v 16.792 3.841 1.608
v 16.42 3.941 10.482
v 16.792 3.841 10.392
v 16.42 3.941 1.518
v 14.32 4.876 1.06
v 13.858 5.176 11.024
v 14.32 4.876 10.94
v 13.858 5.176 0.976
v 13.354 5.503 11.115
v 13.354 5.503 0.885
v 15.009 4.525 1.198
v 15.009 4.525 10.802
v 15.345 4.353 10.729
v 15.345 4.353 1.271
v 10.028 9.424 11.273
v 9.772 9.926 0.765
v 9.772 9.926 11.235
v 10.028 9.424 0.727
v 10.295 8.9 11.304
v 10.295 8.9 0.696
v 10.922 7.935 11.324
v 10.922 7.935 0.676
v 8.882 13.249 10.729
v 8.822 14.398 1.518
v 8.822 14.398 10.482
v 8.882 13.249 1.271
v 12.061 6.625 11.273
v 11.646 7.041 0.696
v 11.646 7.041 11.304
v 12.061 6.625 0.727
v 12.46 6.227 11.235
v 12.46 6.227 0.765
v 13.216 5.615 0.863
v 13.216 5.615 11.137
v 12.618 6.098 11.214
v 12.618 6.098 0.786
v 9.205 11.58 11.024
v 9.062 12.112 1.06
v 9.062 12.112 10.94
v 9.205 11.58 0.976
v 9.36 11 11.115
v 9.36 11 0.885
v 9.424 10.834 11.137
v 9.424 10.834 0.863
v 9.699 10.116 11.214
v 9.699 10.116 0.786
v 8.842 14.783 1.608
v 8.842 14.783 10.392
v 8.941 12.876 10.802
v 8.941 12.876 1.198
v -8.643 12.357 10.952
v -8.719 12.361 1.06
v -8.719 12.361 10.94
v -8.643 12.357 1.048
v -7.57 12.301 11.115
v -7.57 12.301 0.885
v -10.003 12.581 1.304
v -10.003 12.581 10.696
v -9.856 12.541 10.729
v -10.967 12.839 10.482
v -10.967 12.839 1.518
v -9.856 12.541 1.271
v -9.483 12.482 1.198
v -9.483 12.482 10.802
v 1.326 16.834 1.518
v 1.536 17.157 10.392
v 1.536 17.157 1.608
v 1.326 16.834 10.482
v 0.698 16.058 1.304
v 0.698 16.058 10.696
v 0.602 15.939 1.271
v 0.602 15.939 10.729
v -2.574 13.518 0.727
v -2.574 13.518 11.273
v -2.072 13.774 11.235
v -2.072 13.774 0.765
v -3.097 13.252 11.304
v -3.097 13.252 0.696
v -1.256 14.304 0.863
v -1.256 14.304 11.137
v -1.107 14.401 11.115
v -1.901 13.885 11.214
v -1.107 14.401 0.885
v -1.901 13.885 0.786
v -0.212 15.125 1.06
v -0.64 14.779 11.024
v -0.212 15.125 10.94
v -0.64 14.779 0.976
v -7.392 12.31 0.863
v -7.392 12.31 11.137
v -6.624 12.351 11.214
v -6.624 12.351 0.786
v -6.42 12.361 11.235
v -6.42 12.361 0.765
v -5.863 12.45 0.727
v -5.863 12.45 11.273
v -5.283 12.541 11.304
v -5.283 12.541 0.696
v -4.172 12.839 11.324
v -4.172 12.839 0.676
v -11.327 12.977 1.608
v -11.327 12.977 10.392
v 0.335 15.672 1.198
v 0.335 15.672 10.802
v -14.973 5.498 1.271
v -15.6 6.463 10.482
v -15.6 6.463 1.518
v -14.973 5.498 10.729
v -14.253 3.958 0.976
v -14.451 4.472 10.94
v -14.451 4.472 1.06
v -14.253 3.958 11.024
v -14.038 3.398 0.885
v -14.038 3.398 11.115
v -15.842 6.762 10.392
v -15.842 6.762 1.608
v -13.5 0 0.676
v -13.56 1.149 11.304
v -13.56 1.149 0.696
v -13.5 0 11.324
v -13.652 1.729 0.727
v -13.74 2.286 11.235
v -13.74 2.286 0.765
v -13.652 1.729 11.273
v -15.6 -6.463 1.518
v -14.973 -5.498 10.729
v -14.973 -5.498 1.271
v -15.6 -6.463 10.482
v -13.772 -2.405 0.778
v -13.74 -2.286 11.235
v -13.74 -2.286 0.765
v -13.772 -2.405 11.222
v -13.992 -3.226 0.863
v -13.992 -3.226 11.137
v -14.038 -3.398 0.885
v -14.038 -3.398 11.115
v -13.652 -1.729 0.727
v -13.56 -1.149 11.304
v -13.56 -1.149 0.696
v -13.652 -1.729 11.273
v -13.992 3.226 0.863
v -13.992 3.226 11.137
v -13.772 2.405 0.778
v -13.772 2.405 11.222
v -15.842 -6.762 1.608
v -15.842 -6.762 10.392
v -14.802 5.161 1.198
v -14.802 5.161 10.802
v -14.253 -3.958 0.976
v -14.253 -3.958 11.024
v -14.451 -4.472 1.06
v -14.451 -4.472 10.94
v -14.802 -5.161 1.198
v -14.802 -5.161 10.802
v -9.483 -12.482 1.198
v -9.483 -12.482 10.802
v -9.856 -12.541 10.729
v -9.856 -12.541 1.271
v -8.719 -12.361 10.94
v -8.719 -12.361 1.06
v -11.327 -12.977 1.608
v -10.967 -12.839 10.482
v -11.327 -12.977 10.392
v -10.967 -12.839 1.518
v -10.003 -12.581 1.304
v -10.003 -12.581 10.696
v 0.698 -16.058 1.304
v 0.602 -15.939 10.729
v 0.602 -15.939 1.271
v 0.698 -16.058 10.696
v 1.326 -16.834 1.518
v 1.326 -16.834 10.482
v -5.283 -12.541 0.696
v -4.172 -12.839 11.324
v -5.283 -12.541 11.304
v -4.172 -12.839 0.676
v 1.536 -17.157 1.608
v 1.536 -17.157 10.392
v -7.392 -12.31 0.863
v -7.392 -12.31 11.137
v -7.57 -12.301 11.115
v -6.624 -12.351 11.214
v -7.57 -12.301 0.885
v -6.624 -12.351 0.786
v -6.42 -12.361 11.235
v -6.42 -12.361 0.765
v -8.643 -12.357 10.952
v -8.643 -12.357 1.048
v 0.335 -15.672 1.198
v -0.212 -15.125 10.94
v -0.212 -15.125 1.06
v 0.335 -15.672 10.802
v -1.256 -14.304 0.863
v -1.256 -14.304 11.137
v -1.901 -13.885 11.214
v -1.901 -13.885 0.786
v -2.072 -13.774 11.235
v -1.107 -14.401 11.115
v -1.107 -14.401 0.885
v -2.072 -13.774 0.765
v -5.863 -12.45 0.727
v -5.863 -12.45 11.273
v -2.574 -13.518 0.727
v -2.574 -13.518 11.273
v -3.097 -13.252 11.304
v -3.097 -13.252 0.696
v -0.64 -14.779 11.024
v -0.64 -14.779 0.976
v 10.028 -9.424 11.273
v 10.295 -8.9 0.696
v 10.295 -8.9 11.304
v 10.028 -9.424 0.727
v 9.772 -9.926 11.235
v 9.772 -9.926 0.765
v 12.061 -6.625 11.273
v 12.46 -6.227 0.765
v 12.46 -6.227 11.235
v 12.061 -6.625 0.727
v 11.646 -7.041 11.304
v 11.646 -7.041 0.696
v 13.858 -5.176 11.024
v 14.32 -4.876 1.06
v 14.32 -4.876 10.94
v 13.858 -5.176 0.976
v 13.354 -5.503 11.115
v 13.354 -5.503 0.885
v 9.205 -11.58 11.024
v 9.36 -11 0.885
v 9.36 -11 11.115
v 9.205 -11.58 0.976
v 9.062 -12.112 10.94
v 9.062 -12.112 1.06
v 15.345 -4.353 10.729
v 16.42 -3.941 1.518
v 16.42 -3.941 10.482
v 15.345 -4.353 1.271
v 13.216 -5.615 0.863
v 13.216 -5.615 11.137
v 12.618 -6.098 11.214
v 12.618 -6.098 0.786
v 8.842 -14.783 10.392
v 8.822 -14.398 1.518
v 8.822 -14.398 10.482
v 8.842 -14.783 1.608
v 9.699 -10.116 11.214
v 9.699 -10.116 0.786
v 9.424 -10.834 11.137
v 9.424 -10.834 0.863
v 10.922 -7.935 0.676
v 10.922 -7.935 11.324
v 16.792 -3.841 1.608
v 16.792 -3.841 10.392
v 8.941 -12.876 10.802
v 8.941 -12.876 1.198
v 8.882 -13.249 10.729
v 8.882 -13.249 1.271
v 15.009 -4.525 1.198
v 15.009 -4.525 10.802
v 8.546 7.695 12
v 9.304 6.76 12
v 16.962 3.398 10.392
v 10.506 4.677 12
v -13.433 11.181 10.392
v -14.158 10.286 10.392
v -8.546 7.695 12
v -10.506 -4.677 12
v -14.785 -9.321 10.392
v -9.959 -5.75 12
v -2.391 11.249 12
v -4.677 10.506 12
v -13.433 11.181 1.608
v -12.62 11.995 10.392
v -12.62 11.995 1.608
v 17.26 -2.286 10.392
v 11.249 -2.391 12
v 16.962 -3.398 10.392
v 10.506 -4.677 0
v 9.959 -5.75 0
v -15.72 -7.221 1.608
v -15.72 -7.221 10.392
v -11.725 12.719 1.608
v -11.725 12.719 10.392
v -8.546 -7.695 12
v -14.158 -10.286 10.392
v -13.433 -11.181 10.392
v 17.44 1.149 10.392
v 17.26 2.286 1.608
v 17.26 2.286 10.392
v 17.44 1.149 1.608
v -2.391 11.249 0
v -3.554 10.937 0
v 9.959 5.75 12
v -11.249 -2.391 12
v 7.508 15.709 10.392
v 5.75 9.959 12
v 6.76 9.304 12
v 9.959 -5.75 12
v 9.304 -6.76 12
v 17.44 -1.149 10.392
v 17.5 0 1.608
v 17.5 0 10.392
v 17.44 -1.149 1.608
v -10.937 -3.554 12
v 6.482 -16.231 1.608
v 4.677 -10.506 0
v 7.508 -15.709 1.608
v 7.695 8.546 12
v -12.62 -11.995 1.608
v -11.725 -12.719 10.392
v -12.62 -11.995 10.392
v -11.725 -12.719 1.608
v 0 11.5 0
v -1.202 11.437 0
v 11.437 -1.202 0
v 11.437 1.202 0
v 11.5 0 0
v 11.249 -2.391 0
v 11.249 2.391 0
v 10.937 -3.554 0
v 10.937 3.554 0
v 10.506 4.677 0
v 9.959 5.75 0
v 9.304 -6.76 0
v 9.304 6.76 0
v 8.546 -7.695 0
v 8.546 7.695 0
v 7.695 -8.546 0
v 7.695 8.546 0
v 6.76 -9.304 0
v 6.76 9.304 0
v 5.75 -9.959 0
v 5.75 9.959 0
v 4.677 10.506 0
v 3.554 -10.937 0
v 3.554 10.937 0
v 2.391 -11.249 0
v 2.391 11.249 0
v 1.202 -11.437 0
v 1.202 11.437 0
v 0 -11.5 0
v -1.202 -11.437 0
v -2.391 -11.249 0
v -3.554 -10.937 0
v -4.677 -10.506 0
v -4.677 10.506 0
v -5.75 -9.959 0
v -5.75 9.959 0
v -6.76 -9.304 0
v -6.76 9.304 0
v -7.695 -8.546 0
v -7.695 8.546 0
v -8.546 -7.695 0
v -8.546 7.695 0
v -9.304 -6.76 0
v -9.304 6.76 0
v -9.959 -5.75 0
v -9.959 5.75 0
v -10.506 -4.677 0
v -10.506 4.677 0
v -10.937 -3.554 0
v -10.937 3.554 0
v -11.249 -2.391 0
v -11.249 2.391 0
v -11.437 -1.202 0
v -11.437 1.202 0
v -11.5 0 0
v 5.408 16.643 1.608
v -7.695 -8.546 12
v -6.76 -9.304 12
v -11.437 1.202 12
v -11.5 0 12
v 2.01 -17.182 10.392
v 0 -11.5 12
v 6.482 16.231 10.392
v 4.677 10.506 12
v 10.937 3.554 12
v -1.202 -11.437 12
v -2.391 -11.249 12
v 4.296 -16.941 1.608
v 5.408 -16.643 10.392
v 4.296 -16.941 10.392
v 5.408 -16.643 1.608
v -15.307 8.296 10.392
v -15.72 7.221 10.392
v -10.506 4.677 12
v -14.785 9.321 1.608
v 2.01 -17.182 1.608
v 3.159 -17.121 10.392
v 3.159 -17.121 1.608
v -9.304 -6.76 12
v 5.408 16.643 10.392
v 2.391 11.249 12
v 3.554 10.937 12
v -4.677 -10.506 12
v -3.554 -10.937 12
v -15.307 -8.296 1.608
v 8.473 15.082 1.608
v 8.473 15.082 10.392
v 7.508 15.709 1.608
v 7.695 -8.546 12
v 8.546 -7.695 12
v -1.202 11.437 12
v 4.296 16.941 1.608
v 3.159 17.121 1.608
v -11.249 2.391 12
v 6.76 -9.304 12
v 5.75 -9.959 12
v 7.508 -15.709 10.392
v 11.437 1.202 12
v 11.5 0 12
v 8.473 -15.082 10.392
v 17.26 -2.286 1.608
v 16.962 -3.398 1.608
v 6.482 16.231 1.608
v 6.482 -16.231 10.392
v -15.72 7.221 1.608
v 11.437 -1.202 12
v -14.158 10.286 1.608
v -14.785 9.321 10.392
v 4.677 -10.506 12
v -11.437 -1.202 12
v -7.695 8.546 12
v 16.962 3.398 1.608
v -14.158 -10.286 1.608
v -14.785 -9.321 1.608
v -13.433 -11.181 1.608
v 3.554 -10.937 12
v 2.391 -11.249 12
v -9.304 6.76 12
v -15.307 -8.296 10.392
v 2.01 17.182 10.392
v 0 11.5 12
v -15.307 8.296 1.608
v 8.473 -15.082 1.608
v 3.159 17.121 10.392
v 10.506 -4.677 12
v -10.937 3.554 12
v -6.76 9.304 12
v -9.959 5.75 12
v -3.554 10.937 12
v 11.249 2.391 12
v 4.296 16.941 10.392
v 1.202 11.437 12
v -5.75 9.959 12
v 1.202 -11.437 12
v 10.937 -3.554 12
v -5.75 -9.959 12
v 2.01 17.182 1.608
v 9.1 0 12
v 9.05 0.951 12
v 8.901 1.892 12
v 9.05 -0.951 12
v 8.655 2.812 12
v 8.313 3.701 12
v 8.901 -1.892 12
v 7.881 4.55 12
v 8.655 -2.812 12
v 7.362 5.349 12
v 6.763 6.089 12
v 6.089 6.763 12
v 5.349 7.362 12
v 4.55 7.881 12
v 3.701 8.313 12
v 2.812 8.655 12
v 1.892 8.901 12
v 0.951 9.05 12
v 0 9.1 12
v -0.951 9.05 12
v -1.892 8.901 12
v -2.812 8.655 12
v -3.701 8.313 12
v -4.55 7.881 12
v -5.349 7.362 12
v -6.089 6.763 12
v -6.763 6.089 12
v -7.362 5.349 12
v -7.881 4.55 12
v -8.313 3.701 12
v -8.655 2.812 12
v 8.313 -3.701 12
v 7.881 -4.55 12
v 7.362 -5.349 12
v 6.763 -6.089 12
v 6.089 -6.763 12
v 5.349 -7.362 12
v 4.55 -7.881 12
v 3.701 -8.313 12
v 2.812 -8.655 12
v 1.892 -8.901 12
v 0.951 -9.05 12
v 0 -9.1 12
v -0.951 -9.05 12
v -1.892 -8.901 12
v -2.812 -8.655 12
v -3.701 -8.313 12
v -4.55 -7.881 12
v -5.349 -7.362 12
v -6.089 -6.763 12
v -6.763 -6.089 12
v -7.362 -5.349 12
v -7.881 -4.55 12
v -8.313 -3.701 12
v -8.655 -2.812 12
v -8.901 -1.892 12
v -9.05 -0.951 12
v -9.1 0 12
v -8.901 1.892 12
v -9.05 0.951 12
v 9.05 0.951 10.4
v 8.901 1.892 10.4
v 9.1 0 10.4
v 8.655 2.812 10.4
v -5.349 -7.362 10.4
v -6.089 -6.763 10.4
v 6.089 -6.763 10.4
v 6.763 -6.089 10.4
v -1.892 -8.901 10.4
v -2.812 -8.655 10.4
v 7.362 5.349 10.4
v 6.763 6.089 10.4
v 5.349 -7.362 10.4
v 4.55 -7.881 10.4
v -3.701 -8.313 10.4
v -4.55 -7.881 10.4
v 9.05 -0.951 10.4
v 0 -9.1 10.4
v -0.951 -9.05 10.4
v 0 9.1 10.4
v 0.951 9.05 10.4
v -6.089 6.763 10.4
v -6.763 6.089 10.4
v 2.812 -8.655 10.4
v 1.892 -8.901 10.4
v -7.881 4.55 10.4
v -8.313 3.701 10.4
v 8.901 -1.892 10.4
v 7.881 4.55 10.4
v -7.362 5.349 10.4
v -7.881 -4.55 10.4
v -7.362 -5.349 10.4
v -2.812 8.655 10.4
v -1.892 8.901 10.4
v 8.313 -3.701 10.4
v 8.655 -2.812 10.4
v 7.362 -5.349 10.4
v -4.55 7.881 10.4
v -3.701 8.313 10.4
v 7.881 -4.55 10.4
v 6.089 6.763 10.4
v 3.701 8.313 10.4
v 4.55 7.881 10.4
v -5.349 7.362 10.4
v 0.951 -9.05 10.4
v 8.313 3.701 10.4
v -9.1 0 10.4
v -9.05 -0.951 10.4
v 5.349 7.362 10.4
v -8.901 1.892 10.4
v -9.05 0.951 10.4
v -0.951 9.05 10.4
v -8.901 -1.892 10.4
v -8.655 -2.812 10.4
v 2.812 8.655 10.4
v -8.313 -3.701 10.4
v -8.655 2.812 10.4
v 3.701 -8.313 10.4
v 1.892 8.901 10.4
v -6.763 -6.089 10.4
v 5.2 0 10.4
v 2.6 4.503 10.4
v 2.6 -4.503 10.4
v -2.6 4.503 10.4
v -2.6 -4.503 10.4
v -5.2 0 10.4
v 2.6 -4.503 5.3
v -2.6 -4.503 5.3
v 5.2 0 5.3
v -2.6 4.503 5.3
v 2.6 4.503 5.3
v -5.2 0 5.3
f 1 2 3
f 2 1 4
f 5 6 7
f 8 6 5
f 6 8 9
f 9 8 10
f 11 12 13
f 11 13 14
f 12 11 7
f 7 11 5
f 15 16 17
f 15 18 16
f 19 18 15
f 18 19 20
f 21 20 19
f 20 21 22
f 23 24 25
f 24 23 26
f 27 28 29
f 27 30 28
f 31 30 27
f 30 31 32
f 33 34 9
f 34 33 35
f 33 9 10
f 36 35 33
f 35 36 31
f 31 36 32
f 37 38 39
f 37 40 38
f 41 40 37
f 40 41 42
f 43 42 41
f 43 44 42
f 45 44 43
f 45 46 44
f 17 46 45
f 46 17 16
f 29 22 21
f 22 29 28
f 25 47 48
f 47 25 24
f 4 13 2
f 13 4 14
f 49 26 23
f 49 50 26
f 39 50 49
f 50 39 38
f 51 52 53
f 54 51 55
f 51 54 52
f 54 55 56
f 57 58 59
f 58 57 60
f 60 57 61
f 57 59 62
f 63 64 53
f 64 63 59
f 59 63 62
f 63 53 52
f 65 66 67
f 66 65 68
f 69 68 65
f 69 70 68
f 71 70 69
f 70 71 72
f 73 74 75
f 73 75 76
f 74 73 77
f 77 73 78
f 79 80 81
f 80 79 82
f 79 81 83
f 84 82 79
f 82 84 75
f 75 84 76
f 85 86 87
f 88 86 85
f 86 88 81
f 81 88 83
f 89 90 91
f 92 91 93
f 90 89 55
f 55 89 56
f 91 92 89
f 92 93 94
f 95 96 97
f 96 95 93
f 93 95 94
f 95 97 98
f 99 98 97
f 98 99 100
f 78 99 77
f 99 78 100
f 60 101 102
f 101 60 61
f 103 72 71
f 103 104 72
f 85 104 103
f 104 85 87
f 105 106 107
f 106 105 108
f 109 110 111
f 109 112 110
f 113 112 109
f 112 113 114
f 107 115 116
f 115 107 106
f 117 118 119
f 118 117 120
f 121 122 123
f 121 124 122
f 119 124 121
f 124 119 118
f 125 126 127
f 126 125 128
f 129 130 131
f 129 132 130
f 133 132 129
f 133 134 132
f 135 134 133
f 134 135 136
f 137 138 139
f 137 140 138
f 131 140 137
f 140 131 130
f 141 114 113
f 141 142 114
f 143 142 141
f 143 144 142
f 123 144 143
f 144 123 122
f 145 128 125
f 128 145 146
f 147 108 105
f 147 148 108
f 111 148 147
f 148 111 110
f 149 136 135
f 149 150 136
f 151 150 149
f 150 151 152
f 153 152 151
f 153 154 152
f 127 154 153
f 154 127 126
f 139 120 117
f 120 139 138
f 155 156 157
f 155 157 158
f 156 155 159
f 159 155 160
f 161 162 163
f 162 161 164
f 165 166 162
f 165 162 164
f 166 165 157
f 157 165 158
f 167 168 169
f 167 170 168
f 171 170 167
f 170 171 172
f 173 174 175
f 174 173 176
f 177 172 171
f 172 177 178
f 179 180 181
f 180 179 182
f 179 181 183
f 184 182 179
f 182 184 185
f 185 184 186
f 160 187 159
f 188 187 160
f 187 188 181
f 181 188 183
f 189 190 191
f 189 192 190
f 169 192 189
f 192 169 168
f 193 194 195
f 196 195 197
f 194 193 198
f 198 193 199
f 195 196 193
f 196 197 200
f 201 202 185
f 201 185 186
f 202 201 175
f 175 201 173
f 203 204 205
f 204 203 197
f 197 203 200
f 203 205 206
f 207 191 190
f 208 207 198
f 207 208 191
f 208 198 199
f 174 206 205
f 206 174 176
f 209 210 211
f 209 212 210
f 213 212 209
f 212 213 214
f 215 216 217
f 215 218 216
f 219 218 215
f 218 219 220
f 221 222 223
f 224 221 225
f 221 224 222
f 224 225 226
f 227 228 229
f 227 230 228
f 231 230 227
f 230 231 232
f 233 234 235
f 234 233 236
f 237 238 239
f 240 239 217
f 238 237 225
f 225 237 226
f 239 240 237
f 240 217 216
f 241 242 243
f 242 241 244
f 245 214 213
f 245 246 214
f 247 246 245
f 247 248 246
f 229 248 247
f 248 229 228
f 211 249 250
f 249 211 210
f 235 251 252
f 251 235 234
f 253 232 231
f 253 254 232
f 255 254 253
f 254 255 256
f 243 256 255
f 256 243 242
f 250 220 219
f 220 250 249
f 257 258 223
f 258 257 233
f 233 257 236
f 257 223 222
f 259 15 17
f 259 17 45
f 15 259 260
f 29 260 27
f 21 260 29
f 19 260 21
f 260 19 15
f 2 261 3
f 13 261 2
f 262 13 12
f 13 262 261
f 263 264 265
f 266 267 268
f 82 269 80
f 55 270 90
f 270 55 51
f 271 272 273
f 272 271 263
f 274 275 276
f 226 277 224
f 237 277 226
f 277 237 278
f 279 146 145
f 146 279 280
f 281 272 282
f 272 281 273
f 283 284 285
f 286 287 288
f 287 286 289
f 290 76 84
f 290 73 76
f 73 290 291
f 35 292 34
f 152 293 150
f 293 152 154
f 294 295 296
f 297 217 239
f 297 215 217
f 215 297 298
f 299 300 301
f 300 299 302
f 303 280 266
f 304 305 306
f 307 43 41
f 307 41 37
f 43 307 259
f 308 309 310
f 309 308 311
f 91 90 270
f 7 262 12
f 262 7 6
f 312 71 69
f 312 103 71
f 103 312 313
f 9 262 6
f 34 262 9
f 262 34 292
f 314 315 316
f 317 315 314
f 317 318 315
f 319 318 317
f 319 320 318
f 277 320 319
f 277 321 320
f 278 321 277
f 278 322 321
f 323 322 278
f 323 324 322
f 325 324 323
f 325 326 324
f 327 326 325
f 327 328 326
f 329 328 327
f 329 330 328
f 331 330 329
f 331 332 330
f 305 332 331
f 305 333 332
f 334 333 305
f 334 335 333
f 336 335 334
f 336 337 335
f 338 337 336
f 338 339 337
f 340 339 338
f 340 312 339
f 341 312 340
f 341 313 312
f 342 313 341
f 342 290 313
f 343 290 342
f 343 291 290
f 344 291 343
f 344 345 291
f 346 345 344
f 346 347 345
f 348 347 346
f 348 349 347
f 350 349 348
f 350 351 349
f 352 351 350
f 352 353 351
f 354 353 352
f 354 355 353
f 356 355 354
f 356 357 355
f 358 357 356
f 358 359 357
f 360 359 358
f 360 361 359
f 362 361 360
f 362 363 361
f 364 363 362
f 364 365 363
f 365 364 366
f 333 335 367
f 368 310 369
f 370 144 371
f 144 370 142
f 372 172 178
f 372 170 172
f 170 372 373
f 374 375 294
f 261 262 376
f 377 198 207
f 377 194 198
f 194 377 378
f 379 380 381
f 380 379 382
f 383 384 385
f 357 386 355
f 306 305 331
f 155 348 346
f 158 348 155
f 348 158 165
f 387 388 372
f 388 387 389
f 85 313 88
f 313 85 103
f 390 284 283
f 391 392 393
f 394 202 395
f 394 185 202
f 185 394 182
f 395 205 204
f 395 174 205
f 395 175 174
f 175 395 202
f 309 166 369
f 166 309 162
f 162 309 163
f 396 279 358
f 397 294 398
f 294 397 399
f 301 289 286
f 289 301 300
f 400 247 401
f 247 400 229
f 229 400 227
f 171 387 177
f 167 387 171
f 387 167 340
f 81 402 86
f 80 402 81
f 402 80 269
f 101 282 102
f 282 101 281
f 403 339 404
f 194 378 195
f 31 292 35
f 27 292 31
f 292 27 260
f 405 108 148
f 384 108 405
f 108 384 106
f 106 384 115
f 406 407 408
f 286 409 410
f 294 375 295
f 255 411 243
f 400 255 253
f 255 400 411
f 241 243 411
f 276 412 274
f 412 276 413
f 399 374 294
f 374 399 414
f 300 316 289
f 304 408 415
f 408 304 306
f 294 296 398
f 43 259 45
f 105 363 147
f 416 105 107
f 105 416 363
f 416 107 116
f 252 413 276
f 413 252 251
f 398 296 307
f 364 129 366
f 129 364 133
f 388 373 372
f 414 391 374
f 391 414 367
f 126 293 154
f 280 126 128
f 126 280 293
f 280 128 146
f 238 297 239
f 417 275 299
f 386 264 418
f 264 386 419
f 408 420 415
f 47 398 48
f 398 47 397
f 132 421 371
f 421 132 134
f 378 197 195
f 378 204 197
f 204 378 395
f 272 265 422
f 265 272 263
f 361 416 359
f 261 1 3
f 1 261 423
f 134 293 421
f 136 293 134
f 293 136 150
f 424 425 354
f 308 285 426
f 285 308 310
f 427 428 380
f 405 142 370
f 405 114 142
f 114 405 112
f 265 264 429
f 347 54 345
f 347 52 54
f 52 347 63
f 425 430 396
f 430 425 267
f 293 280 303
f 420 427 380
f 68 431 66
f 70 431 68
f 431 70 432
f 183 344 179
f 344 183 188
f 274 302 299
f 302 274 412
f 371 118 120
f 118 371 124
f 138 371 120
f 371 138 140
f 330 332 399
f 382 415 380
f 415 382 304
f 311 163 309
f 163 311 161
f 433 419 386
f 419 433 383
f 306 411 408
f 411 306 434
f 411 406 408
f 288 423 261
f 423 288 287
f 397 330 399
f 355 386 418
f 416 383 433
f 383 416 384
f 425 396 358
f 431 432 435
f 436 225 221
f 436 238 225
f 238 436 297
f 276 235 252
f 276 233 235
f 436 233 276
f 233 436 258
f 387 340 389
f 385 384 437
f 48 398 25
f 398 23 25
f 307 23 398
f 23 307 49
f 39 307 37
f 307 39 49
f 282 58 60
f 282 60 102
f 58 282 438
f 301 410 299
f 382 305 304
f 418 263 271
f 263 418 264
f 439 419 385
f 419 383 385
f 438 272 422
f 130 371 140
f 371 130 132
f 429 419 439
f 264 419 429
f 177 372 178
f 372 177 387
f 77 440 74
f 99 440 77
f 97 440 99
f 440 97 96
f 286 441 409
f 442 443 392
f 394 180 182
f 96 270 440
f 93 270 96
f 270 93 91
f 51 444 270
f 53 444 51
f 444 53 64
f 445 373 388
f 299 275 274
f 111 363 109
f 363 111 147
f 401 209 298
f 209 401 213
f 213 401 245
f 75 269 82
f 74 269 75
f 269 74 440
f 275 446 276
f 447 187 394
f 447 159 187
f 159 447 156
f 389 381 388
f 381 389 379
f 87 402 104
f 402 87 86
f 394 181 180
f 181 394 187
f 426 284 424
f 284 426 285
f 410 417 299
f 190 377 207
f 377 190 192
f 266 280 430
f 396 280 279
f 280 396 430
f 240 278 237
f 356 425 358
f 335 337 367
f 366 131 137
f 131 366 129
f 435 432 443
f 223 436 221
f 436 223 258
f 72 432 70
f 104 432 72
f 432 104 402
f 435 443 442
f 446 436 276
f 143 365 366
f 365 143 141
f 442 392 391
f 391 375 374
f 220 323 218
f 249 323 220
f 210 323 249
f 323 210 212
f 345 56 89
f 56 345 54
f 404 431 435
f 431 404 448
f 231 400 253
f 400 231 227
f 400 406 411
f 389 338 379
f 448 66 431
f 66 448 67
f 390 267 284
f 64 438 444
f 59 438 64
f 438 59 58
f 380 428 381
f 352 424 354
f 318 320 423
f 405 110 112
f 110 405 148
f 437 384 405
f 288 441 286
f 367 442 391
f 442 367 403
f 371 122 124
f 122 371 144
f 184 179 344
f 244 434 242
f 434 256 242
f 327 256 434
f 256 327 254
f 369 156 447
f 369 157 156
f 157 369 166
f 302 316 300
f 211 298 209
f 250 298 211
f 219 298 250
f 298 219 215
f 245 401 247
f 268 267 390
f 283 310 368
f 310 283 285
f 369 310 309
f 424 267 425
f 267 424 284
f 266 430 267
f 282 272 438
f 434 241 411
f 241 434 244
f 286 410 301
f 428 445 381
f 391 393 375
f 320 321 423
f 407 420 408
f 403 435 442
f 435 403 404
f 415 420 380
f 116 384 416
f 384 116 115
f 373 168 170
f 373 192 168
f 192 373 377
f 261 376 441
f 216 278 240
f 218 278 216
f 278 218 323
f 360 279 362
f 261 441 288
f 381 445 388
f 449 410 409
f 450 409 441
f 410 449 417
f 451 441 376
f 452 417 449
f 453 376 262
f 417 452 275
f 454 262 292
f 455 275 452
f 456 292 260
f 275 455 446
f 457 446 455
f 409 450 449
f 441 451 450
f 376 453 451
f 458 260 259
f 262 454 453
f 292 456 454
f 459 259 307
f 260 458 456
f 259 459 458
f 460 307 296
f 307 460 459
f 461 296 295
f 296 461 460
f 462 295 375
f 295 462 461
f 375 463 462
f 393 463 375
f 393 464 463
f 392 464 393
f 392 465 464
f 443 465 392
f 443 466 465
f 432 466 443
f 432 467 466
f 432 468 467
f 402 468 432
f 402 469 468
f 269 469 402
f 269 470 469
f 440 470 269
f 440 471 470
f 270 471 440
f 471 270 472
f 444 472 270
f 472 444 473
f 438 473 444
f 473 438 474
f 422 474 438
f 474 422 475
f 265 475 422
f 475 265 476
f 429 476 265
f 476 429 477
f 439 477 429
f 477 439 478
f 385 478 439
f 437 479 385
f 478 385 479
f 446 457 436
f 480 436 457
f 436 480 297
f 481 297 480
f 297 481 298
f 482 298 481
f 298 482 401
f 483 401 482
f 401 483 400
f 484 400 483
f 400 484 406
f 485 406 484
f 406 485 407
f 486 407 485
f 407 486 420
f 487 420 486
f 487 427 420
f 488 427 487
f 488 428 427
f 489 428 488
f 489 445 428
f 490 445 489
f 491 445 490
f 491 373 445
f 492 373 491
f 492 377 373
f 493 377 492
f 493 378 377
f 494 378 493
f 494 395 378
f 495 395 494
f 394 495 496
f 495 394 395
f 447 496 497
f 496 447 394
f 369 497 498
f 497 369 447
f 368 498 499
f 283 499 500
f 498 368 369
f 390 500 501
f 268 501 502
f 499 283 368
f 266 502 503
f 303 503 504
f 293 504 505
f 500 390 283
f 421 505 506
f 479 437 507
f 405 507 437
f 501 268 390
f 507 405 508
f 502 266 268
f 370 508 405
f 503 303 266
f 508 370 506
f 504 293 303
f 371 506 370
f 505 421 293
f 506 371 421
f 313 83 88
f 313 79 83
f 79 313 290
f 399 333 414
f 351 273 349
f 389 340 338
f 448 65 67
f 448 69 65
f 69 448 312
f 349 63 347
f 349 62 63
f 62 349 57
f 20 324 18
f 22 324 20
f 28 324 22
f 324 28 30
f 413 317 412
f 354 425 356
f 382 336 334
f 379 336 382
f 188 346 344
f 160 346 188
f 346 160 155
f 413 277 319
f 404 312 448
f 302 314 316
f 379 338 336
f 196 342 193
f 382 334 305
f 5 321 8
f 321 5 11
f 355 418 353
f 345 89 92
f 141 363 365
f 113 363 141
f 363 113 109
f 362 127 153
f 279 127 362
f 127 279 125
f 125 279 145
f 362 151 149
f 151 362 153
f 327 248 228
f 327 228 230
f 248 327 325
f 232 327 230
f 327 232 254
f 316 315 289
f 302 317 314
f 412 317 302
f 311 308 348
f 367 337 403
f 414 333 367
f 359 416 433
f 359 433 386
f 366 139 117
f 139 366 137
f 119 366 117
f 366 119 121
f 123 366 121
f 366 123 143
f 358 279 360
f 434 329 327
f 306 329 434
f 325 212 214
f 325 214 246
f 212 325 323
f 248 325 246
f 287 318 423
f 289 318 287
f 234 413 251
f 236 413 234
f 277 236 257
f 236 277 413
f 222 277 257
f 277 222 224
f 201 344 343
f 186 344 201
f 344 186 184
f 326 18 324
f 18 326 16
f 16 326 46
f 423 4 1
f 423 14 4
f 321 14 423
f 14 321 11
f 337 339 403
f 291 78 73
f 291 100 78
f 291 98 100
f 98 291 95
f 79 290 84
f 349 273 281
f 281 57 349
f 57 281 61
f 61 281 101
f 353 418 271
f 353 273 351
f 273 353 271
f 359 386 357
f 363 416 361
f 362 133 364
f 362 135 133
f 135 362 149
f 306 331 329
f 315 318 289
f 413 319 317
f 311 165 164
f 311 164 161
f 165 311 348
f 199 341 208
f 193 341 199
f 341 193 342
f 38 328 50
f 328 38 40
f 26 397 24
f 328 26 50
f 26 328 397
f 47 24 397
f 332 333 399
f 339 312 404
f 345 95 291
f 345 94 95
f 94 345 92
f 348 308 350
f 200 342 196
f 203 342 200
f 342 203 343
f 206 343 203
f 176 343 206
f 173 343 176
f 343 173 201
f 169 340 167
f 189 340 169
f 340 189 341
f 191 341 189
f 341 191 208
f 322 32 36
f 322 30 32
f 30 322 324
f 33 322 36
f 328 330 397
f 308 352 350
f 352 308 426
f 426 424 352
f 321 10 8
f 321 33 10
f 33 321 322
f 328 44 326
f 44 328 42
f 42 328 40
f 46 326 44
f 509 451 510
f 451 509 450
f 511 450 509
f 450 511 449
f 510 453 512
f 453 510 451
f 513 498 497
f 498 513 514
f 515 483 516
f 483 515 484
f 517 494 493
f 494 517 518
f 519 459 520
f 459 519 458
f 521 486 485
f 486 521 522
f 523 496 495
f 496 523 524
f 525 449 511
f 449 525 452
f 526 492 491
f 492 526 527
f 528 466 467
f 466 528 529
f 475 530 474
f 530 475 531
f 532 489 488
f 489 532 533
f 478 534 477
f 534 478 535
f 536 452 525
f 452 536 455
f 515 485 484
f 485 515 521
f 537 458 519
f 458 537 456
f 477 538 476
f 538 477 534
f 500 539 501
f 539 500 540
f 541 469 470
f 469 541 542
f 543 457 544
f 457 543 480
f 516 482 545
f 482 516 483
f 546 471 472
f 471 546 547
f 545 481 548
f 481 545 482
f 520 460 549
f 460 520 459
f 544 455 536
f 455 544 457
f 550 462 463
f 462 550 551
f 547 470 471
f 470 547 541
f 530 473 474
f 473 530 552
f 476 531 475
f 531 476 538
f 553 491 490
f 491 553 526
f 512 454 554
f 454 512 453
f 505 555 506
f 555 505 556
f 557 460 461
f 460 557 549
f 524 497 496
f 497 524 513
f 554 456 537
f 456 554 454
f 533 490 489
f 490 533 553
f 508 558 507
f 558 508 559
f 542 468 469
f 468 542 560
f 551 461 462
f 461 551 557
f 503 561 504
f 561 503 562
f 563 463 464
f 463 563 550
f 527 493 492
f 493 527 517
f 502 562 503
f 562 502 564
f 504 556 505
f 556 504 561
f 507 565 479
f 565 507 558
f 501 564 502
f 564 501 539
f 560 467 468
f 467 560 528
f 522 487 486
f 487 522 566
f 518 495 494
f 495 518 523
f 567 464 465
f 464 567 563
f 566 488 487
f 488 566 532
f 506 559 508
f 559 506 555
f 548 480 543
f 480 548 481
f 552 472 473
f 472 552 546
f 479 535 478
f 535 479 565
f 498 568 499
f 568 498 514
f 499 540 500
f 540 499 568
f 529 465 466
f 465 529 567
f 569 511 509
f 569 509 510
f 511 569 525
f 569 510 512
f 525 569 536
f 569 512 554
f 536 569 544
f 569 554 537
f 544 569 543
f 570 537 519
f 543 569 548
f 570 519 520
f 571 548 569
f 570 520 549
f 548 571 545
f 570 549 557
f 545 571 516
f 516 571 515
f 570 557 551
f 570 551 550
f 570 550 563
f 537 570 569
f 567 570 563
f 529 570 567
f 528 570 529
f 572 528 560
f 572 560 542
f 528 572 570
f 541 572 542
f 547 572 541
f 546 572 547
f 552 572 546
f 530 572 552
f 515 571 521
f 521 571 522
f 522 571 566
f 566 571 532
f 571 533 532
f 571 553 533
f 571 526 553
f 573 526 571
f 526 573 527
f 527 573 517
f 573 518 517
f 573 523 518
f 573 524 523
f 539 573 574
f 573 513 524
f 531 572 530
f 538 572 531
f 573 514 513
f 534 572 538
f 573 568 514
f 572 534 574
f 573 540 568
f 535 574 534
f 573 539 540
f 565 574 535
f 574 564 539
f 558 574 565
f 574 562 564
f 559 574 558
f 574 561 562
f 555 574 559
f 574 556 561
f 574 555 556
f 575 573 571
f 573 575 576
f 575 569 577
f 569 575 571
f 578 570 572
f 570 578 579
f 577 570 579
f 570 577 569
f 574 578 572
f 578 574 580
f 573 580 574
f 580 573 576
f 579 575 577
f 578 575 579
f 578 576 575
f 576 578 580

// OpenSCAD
// A fancier alternative to the star knob, having a bit less grip

// In general you'll want to print the knob
PRINT_KNOB = true;

// If you're out of metal ones, print a plastic one
PRINT_WASHER = false;

/* [Knob] */

// The value of the knob's largest cross-section
DIAMETER = 35;

// Height of the knob
HEIGHT = 12;

// Amount of cutouts in the knob
HANDLES = 5;

// The angle of the chamfer
CHAMFER_ANGLE = 15; // [0:45]

// The depth of the chamfer into the knob
CHAMFER_DISTANCE = 6;

// The depth of the handle cutouts into the knob
CUTOUT_DEPTH = 4;

// Generally unchecked for usage with bolts, checked for usage with nuts
THROUGH_BORE = false;

/* [Bolt] */

// The diameter of the shaft, add some clearance for a loose fit
BOLT_DIAMETER = 6.4;

// The diameter of the inscribed circle, or the size of wrench you need
// Add some clearance if you're glueing the bolt
BOLT_HEAD_DIAMETER = 10.4;

// How high the head is, and half a layer clearance so you're sure it fits
BOLT_HEAD_HEIGHT = 5.1;

/* [Washer] */

// The diameter of the washer
WASHER_DIAMETER = 18.2;

// The height of the washer
WASHER_HEIGHT = 1.6;

// The diameter of the bushing
WASHER_BUSHING_DIAMETER = 10;

// The height of a optional bushing
WASHER_BUSHING_HEIGHT = 1;

module dummy() {};

$fa = $preview? 12 : 6;
$fs = $preview? 2 : 0.2;

EPS = 0.01;

module star_knob_fancy(
    radius=DIAMETER / 2,
    height=HEIGHT,
    chamfer_radius=DIAMETER / 2 - CHAMFER_DISTANCE,
    chamfer_height=tan(CHAMFER_ANGLE) * CHAMFER_DISTANCE,
    handles=HANDLES,
    cutout_depth=CUTOUT_DEPTH,
    bolt_radius=BOLT_DIAMETER/2,
    bolt_head_radius=BOLT_HEAD_DIAMETER/2,
    bolt_head_height=BOLT_HEAD_HEIGHT,
    washer_radius = WASHER_DIAMETER/2,
    washer_height = WASHER_HEIGHT,
    through_bore = THROUGH_BORE
      ) {

    cutout_radius = PI * radius / handles;

    hull_center = radius - cutout_radius;

    cutout_center = radius - cutout_depth + cutout_radius;

    difference() {
        hull() {
                // the rounded polygon
                for(a=[0:360/handles:360])
                    rotate(a) translate([hull_center, 0])
                        cylinder(height - 2 * chamfer_height, r=cutout_radius, center=true);
            // top & bottom chamfer
            cylinder(height, r=chamfer_radius, center=true);
        }
        // handle cutouts
        for(a=[180/handles:360/handles:360])
            rotate(a) translate([cutout_center, 0])
                cylinder(height + 2 * EPS, r=cutout_radius, center=true);
        
        // washer cutout
        if(washer_height > 0)
            translate([0,0, height/2 - washer_height])
                cylinder(washer_height + EPS, r=washer_radius);
        
        // bolt head cutout
        translate([0,0, height/2 - washer_height - bolt_head_height]) cylinder(bolt_head_height + EPS, r=bolt_head_radius, $fn=6);
        
        // bolt cutout
        if(through_bore)
            translate([0,0, height/2 - washer_height - bolt_head_height + EPS]) rotate([180,0]) cylinder(height, r=bolt_radius);
    }    
}

module star_knob_fancy_washer(
                        washer_radius=WASHER_DIAMETER/2,
                        washer_height=WASHER_HEIGHT,
                        washer_bushing_radius=WASHER_BUSHING_DIAMETER/2,
                        washer_bushing_height=WASHER_BUSHING_HEIGHT,
                        bolt_radius=BOLT_DIAMETER/2
                        ) {
    chamfer_r = (washer_radius - washer_bushing_radius) / 2;
    
    rotate_extrude() offset(delta=-chamfer_r, chamfer=true) offset(delta=chamfer_r) {
        translate([bolt_radius,0]) square([washer_radius - bolt_radius, washer_height]);
        translate([bolt_radius,0]) square([washer_bushing_radius - bolt_radius, washer_bushing_height + washer_height]);
    }
}

if (PRINT_KNOB) translate([0,0,HEIGHT/2]) star_knob_fancy();
if (PRINT_WASHER) translate([DIAMETER,0,0]) star_knob_fancy_washer();
